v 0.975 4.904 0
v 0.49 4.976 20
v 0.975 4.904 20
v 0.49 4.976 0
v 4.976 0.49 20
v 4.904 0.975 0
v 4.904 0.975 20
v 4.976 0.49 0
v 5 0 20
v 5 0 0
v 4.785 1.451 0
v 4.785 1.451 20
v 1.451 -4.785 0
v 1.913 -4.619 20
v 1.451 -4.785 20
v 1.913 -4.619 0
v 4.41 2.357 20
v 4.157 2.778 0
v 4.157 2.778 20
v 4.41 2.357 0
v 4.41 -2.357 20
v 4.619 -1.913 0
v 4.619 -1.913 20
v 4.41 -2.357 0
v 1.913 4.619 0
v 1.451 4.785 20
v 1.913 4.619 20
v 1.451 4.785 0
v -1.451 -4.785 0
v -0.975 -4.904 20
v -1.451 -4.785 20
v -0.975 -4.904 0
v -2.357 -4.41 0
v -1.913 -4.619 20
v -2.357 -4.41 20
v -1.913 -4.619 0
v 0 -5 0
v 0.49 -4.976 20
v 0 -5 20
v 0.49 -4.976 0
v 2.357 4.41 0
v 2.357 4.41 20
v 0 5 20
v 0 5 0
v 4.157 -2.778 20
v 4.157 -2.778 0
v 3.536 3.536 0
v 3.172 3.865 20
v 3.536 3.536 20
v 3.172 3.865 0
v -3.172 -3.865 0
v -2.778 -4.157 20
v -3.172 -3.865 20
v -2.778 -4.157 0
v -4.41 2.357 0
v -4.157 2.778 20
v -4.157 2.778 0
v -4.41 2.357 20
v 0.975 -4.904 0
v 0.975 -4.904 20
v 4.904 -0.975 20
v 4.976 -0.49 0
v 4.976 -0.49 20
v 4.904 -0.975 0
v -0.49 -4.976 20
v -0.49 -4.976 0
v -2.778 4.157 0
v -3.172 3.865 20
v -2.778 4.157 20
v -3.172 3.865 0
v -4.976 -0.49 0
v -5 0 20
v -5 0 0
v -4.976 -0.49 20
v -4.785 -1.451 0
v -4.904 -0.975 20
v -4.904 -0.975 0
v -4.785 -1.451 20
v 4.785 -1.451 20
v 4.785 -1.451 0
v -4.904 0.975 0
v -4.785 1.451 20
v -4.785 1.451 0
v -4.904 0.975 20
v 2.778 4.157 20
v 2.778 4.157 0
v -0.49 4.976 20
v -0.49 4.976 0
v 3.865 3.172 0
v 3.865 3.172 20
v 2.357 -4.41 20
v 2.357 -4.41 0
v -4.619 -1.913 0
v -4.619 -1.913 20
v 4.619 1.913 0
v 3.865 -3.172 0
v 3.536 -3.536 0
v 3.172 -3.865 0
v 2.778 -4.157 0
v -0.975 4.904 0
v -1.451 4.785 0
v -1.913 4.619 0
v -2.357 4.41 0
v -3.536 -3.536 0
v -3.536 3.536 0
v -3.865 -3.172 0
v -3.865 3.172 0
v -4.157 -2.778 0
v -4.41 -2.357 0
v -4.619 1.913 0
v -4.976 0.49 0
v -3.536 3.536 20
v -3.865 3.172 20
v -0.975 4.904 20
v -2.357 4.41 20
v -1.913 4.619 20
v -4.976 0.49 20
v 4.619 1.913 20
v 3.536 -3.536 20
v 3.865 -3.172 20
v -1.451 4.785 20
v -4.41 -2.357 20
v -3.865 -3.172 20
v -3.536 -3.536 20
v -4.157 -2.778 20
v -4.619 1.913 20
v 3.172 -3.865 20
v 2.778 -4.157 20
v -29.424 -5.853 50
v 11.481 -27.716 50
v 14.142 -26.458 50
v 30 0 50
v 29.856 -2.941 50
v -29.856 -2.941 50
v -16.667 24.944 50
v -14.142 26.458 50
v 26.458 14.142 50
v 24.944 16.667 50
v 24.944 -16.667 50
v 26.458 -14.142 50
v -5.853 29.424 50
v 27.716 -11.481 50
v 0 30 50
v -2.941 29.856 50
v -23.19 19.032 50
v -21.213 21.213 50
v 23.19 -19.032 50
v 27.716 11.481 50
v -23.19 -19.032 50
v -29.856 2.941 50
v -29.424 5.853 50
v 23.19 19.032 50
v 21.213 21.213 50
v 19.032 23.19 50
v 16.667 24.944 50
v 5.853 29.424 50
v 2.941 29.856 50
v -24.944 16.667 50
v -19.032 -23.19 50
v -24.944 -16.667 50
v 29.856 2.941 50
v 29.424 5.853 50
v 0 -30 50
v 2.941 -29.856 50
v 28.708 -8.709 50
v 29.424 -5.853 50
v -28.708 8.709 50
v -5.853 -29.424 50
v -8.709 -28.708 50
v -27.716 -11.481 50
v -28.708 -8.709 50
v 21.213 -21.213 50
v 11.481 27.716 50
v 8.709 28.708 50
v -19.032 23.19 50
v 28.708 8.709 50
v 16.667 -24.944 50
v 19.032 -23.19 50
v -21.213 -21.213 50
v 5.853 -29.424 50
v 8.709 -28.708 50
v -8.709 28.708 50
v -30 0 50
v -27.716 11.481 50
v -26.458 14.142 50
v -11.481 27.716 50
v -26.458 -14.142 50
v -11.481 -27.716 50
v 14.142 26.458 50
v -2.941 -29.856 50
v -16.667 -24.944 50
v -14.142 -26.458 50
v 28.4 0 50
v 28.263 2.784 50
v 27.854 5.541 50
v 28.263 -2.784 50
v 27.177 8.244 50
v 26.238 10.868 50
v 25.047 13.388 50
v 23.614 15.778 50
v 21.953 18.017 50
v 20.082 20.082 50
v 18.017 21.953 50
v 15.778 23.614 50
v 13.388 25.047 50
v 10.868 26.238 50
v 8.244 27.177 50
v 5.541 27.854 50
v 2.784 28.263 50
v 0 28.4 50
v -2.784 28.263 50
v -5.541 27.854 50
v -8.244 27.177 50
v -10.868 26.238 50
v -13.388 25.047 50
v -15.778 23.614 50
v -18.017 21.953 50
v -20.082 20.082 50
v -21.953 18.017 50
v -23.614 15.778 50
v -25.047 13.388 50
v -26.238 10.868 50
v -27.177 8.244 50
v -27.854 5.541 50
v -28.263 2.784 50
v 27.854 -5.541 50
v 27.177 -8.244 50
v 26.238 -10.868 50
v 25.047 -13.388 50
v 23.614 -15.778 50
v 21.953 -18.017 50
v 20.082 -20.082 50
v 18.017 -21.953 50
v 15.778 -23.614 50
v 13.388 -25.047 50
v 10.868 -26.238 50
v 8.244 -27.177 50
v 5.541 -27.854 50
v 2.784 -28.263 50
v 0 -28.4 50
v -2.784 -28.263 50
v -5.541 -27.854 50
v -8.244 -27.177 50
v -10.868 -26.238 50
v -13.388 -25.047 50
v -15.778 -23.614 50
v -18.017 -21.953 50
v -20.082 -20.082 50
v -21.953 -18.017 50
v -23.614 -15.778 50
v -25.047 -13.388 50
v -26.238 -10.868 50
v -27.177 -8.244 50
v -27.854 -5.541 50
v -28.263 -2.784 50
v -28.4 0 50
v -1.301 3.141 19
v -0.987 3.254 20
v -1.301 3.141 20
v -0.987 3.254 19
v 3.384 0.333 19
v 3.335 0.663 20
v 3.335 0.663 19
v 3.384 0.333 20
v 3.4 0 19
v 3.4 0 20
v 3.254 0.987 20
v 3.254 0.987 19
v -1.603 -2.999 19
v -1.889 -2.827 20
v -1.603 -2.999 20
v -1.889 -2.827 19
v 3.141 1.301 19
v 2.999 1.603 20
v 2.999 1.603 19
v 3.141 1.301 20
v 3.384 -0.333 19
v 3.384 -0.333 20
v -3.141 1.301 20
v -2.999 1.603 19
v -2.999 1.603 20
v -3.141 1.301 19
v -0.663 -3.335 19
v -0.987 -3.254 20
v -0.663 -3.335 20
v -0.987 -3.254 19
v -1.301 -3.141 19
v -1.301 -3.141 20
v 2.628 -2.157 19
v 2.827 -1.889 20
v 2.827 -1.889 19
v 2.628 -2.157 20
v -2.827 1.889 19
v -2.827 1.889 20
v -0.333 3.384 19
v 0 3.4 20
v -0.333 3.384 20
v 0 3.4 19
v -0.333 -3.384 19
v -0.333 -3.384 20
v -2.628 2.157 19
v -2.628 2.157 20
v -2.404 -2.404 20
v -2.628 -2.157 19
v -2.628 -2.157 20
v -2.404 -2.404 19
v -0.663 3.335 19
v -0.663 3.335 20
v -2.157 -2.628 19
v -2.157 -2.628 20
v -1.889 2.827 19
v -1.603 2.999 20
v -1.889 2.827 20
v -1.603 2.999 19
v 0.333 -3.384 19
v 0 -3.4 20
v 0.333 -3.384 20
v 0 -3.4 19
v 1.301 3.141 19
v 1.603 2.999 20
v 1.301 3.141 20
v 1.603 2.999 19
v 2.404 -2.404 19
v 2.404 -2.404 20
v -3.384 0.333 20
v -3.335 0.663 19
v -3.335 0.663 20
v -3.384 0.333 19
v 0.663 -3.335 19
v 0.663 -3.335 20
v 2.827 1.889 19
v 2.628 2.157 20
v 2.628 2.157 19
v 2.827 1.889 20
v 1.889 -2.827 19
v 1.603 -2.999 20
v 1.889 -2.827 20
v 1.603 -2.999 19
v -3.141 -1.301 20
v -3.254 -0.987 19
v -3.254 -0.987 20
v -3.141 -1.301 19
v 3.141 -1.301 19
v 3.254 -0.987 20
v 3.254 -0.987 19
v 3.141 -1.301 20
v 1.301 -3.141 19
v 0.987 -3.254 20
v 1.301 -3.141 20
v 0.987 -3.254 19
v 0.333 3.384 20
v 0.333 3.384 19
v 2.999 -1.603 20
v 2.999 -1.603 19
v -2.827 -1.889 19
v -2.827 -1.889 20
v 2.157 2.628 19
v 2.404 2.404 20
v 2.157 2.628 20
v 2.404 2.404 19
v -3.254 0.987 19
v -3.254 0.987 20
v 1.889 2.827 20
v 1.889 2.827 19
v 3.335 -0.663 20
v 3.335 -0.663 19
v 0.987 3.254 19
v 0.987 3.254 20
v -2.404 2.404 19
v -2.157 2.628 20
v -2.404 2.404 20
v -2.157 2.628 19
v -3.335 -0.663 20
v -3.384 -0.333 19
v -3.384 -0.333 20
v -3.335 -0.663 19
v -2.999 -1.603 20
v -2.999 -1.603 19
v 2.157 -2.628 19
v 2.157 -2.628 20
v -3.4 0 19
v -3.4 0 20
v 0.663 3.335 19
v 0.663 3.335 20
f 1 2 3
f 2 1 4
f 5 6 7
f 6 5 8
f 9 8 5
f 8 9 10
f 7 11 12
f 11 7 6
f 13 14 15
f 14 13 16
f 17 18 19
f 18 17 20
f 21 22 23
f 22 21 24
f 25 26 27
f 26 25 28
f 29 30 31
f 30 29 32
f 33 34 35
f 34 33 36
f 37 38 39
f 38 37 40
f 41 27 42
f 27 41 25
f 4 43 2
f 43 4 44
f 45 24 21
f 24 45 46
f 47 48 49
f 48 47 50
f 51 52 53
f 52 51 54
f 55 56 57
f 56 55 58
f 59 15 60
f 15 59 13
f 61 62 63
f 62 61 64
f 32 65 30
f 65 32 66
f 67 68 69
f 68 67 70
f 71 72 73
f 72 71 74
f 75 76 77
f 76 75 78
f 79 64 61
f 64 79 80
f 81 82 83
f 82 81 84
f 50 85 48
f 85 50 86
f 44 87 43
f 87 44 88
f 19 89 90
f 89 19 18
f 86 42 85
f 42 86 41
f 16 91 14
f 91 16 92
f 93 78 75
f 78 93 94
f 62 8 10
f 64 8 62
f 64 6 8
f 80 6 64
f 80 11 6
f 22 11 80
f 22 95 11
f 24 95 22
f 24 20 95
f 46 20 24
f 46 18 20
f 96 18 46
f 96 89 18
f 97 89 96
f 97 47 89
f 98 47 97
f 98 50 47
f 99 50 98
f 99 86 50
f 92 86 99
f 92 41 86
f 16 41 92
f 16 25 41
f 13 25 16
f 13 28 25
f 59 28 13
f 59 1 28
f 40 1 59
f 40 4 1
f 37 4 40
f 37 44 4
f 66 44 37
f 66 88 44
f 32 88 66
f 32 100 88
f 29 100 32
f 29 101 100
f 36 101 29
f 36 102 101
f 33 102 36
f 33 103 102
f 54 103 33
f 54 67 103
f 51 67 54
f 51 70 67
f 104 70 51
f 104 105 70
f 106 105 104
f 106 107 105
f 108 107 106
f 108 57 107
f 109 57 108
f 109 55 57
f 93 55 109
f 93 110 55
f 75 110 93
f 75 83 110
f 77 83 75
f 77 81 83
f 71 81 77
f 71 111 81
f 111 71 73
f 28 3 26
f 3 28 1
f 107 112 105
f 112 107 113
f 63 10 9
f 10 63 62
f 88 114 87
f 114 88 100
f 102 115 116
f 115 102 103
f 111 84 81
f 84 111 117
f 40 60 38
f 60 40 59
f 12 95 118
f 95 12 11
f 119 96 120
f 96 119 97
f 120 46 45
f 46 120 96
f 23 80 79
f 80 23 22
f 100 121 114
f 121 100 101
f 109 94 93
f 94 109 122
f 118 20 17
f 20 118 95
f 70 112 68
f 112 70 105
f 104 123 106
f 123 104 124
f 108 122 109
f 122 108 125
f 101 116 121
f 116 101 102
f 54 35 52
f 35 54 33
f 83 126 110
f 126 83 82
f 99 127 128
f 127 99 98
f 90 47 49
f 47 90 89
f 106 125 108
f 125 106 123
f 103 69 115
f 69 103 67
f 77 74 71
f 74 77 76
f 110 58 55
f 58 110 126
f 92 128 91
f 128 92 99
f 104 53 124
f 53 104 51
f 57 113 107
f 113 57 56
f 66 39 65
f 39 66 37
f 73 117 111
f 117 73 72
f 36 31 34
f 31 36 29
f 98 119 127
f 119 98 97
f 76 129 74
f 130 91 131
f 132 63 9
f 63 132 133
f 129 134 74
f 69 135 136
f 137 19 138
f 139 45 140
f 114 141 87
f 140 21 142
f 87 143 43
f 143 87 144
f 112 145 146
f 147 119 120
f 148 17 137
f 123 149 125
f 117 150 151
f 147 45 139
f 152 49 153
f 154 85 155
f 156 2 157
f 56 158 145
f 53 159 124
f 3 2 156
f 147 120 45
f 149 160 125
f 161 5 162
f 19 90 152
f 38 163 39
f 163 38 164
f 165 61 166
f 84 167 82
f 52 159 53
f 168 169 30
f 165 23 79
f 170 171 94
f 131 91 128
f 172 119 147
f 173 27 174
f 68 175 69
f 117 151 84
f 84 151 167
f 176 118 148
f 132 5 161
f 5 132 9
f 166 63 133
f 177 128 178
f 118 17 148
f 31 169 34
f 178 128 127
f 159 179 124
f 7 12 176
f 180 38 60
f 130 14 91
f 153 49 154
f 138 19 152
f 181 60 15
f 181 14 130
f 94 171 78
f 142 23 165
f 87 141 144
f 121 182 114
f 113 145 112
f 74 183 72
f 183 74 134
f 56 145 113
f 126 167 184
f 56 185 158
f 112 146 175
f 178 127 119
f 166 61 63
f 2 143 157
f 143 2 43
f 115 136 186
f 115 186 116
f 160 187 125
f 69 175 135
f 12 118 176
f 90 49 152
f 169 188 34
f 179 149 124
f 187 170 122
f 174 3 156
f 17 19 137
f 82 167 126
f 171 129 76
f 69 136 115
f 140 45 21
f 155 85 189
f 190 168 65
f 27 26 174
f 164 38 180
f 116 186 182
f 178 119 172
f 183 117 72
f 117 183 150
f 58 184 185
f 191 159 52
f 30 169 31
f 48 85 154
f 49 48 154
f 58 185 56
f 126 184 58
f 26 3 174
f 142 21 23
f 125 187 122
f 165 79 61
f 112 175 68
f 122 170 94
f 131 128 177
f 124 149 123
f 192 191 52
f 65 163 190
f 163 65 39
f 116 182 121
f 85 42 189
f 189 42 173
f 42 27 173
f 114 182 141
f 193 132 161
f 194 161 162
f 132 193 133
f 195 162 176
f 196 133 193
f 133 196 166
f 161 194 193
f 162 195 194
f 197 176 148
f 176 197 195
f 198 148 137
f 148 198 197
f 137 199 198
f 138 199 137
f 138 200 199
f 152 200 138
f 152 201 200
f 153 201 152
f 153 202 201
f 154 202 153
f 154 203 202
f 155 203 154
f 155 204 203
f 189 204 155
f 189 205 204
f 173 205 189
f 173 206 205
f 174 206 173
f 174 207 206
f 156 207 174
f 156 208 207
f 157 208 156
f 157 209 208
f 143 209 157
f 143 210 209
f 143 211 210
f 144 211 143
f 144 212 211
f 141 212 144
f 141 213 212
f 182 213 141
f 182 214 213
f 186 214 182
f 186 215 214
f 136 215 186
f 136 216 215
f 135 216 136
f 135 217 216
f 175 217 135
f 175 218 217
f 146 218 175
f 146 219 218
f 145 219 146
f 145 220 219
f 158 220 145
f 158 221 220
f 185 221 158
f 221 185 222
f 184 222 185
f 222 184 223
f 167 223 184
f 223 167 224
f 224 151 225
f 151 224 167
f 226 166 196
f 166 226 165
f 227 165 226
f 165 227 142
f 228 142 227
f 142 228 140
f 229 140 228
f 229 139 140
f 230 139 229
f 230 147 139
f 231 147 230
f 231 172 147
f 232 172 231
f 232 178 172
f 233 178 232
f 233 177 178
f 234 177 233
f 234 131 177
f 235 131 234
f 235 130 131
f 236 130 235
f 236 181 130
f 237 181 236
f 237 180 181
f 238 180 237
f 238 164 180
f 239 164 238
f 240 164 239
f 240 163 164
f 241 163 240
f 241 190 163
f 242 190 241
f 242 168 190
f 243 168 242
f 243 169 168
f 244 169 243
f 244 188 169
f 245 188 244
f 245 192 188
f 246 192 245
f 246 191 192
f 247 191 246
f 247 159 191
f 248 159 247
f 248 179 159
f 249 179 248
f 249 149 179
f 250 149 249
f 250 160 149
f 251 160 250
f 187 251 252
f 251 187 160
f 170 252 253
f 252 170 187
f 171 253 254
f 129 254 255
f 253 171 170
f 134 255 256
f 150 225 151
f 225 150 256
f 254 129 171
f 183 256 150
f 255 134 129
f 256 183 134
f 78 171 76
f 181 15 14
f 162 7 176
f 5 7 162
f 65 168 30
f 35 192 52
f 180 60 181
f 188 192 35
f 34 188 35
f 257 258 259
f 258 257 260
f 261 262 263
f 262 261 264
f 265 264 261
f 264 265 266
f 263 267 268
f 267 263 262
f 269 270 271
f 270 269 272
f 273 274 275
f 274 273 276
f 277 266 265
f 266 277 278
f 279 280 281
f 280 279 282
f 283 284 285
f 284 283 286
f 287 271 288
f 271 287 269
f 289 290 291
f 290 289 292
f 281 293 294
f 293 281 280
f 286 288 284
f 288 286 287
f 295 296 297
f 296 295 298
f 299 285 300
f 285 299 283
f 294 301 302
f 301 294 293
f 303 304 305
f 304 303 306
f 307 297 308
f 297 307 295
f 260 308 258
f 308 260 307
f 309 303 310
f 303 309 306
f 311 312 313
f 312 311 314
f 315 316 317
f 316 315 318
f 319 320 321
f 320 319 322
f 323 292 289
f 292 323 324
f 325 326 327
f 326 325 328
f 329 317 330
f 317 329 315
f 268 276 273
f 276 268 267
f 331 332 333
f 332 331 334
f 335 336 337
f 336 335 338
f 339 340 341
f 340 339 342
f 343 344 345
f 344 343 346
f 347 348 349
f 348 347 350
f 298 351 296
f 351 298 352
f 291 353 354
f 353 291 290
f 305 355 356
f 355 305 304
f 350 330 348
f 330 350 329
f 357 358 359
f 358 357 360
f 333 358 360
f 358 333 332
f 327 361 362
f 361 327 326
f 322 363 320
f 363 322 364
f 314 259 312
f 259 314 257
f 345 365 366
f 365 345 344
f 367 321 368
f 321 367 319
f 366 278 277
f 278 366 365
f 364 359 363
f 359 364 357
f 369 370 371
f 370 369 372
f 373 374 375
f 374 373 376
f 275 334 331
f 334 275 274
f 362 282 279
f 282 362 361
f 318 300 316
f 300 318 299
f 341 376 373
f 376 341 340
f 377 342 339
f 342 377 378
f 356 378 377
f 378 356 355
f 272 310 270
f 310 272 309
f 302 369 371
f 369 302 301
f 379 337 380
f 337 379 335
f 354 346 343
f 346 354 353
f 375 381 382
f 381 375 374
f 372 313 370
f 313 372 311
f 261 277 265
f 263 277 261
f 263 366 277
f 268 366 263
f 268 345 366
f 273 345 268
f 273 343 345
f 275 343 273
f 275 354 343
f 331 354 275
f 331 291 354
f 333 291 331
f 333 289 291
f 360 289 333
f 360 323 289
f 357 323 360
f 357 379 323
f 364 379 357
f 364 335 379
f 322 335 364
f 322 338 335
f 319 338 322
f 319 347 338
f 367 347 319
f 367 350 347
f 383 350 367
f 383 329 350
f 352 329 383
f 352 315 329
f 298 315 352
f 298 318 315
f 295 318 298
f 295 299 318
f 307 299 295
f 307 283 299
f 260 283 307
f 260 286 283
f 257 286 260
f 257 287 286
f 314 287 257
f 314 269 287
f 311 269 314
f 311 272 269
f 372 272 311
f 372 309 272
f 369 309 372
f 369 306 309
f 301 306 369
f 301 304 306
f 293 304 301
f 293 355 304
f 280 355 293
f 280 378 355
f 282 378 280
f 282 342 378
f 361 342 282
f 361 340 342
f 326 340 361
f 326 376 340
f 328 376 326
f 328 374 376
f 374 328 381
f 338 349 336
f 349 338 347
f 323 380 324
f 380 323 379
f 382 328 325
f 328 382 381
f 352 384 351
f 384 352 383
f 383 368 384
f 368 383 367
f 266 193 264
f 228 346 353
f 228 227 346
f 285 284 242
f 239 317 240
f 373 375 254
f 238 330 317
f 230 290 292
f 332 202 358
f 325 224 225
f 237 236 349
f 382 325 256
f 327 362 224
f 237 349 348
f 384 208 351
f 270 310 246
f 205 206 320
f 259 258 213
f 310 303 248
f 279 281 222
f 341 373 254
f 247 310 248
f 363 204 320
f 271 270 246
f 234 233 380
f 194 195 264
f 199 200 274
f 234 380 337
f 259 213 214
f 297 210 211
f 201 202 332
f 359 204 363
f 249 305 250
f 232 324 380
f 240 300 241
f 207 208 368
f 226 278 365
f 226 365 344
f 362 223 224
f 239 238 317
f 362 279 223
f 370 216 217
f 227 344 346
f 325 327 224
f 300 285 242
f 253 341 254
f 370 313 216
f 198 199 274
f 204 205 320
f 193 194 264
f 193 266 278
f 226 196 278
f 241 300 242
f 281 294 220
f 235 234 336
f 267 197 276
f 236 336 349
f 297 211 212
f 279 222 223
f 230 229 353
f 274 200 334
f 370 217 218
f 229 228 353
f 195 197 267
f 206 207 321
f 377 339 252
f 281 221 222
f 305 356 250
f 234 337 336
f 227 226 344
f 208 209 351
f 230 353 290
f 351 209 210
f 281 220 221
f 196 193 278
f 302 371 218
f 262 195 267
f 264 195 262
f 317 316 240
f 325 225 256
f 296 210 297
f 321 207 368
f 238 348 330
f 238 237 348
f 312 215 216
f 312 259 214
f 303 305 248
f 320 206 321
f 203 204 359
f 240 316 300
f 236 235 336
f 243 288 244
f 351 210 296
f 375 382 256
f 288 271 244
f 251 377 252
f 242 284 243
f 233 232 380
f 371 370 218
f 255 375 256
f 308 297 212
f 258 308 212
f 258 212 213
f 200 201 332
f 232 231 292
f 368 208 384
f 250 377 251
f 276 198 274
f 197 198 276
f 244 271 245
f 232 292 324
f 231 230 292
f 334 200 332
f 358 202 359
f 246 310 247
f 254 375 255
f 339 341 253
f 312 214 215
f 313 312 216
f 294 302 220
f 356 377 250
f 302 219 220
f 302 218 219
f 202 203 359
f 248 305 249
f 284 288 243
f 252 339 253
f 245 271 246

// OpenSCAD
// Lab Funnel - A straight spout tube with a conical funnel on top.
// Printed upright with the wide opening at the top.
// Spout: 10mm OD, 20mm long. Funnel: widens from 10mm to 60mm over 30mm height.
// Wall thickness: 1.6mm everywhere.

$fn = 64;

// Dimensions
spout_od      = 10;
spout_id      = spout_od - 2 * 1.6; // 6.8 mm
spout_height  = 20;
funnel_bottom_od = spout_od;
funnel_top_od   = 60;
funnel_height   = 30;
wall_thickness  = 1.6;

// Calculate inner dimensions for the funnel top
funnel_top_id = funnel_top_od - 2 * wall_thickness;

// Build the part in one difference operation to ensure clean holes
difference() {
    // 1. The Outer Shell (Solid)
    union() {
        // Spout outer cylinder
        cylinder(h = spout_height, d = spout_od);
        
        // Funnel outer cone
        // Starts at z = spout_height with diameter = spout_od
        // Ends at z = spout_height + funnel_height with diameter = funnel_top_od
        translate([0, 0, spout_height]) 
            cylinder(h = funnel_height, 
                    d1 = spout_od, 
                    d2 = funnel_top_od, 
                    center = false);
    }
    
    // 2. The Inner Cavity (Holes)
    union() {
        // Spout inner cylinder (bore)
        translate([0, 0, spout_height - 1]) // Extend slightly past bottom to ensure clean cut
            cylinder(h = spout_height + 1, d = spout_id);
            
        // Funnel inner cone
        // Starts at z = spout_height with diameter = spout_id
        // Ends at z = spout_height + funnel_height with diameter = funnel_top_id
        translate([0, 0, spout_height]) 
            cylinder(h = funnel_height, 
                    d1 = spout_id, 
                    d2 = funnel_top_id, 
                    center = false);
    }
}
